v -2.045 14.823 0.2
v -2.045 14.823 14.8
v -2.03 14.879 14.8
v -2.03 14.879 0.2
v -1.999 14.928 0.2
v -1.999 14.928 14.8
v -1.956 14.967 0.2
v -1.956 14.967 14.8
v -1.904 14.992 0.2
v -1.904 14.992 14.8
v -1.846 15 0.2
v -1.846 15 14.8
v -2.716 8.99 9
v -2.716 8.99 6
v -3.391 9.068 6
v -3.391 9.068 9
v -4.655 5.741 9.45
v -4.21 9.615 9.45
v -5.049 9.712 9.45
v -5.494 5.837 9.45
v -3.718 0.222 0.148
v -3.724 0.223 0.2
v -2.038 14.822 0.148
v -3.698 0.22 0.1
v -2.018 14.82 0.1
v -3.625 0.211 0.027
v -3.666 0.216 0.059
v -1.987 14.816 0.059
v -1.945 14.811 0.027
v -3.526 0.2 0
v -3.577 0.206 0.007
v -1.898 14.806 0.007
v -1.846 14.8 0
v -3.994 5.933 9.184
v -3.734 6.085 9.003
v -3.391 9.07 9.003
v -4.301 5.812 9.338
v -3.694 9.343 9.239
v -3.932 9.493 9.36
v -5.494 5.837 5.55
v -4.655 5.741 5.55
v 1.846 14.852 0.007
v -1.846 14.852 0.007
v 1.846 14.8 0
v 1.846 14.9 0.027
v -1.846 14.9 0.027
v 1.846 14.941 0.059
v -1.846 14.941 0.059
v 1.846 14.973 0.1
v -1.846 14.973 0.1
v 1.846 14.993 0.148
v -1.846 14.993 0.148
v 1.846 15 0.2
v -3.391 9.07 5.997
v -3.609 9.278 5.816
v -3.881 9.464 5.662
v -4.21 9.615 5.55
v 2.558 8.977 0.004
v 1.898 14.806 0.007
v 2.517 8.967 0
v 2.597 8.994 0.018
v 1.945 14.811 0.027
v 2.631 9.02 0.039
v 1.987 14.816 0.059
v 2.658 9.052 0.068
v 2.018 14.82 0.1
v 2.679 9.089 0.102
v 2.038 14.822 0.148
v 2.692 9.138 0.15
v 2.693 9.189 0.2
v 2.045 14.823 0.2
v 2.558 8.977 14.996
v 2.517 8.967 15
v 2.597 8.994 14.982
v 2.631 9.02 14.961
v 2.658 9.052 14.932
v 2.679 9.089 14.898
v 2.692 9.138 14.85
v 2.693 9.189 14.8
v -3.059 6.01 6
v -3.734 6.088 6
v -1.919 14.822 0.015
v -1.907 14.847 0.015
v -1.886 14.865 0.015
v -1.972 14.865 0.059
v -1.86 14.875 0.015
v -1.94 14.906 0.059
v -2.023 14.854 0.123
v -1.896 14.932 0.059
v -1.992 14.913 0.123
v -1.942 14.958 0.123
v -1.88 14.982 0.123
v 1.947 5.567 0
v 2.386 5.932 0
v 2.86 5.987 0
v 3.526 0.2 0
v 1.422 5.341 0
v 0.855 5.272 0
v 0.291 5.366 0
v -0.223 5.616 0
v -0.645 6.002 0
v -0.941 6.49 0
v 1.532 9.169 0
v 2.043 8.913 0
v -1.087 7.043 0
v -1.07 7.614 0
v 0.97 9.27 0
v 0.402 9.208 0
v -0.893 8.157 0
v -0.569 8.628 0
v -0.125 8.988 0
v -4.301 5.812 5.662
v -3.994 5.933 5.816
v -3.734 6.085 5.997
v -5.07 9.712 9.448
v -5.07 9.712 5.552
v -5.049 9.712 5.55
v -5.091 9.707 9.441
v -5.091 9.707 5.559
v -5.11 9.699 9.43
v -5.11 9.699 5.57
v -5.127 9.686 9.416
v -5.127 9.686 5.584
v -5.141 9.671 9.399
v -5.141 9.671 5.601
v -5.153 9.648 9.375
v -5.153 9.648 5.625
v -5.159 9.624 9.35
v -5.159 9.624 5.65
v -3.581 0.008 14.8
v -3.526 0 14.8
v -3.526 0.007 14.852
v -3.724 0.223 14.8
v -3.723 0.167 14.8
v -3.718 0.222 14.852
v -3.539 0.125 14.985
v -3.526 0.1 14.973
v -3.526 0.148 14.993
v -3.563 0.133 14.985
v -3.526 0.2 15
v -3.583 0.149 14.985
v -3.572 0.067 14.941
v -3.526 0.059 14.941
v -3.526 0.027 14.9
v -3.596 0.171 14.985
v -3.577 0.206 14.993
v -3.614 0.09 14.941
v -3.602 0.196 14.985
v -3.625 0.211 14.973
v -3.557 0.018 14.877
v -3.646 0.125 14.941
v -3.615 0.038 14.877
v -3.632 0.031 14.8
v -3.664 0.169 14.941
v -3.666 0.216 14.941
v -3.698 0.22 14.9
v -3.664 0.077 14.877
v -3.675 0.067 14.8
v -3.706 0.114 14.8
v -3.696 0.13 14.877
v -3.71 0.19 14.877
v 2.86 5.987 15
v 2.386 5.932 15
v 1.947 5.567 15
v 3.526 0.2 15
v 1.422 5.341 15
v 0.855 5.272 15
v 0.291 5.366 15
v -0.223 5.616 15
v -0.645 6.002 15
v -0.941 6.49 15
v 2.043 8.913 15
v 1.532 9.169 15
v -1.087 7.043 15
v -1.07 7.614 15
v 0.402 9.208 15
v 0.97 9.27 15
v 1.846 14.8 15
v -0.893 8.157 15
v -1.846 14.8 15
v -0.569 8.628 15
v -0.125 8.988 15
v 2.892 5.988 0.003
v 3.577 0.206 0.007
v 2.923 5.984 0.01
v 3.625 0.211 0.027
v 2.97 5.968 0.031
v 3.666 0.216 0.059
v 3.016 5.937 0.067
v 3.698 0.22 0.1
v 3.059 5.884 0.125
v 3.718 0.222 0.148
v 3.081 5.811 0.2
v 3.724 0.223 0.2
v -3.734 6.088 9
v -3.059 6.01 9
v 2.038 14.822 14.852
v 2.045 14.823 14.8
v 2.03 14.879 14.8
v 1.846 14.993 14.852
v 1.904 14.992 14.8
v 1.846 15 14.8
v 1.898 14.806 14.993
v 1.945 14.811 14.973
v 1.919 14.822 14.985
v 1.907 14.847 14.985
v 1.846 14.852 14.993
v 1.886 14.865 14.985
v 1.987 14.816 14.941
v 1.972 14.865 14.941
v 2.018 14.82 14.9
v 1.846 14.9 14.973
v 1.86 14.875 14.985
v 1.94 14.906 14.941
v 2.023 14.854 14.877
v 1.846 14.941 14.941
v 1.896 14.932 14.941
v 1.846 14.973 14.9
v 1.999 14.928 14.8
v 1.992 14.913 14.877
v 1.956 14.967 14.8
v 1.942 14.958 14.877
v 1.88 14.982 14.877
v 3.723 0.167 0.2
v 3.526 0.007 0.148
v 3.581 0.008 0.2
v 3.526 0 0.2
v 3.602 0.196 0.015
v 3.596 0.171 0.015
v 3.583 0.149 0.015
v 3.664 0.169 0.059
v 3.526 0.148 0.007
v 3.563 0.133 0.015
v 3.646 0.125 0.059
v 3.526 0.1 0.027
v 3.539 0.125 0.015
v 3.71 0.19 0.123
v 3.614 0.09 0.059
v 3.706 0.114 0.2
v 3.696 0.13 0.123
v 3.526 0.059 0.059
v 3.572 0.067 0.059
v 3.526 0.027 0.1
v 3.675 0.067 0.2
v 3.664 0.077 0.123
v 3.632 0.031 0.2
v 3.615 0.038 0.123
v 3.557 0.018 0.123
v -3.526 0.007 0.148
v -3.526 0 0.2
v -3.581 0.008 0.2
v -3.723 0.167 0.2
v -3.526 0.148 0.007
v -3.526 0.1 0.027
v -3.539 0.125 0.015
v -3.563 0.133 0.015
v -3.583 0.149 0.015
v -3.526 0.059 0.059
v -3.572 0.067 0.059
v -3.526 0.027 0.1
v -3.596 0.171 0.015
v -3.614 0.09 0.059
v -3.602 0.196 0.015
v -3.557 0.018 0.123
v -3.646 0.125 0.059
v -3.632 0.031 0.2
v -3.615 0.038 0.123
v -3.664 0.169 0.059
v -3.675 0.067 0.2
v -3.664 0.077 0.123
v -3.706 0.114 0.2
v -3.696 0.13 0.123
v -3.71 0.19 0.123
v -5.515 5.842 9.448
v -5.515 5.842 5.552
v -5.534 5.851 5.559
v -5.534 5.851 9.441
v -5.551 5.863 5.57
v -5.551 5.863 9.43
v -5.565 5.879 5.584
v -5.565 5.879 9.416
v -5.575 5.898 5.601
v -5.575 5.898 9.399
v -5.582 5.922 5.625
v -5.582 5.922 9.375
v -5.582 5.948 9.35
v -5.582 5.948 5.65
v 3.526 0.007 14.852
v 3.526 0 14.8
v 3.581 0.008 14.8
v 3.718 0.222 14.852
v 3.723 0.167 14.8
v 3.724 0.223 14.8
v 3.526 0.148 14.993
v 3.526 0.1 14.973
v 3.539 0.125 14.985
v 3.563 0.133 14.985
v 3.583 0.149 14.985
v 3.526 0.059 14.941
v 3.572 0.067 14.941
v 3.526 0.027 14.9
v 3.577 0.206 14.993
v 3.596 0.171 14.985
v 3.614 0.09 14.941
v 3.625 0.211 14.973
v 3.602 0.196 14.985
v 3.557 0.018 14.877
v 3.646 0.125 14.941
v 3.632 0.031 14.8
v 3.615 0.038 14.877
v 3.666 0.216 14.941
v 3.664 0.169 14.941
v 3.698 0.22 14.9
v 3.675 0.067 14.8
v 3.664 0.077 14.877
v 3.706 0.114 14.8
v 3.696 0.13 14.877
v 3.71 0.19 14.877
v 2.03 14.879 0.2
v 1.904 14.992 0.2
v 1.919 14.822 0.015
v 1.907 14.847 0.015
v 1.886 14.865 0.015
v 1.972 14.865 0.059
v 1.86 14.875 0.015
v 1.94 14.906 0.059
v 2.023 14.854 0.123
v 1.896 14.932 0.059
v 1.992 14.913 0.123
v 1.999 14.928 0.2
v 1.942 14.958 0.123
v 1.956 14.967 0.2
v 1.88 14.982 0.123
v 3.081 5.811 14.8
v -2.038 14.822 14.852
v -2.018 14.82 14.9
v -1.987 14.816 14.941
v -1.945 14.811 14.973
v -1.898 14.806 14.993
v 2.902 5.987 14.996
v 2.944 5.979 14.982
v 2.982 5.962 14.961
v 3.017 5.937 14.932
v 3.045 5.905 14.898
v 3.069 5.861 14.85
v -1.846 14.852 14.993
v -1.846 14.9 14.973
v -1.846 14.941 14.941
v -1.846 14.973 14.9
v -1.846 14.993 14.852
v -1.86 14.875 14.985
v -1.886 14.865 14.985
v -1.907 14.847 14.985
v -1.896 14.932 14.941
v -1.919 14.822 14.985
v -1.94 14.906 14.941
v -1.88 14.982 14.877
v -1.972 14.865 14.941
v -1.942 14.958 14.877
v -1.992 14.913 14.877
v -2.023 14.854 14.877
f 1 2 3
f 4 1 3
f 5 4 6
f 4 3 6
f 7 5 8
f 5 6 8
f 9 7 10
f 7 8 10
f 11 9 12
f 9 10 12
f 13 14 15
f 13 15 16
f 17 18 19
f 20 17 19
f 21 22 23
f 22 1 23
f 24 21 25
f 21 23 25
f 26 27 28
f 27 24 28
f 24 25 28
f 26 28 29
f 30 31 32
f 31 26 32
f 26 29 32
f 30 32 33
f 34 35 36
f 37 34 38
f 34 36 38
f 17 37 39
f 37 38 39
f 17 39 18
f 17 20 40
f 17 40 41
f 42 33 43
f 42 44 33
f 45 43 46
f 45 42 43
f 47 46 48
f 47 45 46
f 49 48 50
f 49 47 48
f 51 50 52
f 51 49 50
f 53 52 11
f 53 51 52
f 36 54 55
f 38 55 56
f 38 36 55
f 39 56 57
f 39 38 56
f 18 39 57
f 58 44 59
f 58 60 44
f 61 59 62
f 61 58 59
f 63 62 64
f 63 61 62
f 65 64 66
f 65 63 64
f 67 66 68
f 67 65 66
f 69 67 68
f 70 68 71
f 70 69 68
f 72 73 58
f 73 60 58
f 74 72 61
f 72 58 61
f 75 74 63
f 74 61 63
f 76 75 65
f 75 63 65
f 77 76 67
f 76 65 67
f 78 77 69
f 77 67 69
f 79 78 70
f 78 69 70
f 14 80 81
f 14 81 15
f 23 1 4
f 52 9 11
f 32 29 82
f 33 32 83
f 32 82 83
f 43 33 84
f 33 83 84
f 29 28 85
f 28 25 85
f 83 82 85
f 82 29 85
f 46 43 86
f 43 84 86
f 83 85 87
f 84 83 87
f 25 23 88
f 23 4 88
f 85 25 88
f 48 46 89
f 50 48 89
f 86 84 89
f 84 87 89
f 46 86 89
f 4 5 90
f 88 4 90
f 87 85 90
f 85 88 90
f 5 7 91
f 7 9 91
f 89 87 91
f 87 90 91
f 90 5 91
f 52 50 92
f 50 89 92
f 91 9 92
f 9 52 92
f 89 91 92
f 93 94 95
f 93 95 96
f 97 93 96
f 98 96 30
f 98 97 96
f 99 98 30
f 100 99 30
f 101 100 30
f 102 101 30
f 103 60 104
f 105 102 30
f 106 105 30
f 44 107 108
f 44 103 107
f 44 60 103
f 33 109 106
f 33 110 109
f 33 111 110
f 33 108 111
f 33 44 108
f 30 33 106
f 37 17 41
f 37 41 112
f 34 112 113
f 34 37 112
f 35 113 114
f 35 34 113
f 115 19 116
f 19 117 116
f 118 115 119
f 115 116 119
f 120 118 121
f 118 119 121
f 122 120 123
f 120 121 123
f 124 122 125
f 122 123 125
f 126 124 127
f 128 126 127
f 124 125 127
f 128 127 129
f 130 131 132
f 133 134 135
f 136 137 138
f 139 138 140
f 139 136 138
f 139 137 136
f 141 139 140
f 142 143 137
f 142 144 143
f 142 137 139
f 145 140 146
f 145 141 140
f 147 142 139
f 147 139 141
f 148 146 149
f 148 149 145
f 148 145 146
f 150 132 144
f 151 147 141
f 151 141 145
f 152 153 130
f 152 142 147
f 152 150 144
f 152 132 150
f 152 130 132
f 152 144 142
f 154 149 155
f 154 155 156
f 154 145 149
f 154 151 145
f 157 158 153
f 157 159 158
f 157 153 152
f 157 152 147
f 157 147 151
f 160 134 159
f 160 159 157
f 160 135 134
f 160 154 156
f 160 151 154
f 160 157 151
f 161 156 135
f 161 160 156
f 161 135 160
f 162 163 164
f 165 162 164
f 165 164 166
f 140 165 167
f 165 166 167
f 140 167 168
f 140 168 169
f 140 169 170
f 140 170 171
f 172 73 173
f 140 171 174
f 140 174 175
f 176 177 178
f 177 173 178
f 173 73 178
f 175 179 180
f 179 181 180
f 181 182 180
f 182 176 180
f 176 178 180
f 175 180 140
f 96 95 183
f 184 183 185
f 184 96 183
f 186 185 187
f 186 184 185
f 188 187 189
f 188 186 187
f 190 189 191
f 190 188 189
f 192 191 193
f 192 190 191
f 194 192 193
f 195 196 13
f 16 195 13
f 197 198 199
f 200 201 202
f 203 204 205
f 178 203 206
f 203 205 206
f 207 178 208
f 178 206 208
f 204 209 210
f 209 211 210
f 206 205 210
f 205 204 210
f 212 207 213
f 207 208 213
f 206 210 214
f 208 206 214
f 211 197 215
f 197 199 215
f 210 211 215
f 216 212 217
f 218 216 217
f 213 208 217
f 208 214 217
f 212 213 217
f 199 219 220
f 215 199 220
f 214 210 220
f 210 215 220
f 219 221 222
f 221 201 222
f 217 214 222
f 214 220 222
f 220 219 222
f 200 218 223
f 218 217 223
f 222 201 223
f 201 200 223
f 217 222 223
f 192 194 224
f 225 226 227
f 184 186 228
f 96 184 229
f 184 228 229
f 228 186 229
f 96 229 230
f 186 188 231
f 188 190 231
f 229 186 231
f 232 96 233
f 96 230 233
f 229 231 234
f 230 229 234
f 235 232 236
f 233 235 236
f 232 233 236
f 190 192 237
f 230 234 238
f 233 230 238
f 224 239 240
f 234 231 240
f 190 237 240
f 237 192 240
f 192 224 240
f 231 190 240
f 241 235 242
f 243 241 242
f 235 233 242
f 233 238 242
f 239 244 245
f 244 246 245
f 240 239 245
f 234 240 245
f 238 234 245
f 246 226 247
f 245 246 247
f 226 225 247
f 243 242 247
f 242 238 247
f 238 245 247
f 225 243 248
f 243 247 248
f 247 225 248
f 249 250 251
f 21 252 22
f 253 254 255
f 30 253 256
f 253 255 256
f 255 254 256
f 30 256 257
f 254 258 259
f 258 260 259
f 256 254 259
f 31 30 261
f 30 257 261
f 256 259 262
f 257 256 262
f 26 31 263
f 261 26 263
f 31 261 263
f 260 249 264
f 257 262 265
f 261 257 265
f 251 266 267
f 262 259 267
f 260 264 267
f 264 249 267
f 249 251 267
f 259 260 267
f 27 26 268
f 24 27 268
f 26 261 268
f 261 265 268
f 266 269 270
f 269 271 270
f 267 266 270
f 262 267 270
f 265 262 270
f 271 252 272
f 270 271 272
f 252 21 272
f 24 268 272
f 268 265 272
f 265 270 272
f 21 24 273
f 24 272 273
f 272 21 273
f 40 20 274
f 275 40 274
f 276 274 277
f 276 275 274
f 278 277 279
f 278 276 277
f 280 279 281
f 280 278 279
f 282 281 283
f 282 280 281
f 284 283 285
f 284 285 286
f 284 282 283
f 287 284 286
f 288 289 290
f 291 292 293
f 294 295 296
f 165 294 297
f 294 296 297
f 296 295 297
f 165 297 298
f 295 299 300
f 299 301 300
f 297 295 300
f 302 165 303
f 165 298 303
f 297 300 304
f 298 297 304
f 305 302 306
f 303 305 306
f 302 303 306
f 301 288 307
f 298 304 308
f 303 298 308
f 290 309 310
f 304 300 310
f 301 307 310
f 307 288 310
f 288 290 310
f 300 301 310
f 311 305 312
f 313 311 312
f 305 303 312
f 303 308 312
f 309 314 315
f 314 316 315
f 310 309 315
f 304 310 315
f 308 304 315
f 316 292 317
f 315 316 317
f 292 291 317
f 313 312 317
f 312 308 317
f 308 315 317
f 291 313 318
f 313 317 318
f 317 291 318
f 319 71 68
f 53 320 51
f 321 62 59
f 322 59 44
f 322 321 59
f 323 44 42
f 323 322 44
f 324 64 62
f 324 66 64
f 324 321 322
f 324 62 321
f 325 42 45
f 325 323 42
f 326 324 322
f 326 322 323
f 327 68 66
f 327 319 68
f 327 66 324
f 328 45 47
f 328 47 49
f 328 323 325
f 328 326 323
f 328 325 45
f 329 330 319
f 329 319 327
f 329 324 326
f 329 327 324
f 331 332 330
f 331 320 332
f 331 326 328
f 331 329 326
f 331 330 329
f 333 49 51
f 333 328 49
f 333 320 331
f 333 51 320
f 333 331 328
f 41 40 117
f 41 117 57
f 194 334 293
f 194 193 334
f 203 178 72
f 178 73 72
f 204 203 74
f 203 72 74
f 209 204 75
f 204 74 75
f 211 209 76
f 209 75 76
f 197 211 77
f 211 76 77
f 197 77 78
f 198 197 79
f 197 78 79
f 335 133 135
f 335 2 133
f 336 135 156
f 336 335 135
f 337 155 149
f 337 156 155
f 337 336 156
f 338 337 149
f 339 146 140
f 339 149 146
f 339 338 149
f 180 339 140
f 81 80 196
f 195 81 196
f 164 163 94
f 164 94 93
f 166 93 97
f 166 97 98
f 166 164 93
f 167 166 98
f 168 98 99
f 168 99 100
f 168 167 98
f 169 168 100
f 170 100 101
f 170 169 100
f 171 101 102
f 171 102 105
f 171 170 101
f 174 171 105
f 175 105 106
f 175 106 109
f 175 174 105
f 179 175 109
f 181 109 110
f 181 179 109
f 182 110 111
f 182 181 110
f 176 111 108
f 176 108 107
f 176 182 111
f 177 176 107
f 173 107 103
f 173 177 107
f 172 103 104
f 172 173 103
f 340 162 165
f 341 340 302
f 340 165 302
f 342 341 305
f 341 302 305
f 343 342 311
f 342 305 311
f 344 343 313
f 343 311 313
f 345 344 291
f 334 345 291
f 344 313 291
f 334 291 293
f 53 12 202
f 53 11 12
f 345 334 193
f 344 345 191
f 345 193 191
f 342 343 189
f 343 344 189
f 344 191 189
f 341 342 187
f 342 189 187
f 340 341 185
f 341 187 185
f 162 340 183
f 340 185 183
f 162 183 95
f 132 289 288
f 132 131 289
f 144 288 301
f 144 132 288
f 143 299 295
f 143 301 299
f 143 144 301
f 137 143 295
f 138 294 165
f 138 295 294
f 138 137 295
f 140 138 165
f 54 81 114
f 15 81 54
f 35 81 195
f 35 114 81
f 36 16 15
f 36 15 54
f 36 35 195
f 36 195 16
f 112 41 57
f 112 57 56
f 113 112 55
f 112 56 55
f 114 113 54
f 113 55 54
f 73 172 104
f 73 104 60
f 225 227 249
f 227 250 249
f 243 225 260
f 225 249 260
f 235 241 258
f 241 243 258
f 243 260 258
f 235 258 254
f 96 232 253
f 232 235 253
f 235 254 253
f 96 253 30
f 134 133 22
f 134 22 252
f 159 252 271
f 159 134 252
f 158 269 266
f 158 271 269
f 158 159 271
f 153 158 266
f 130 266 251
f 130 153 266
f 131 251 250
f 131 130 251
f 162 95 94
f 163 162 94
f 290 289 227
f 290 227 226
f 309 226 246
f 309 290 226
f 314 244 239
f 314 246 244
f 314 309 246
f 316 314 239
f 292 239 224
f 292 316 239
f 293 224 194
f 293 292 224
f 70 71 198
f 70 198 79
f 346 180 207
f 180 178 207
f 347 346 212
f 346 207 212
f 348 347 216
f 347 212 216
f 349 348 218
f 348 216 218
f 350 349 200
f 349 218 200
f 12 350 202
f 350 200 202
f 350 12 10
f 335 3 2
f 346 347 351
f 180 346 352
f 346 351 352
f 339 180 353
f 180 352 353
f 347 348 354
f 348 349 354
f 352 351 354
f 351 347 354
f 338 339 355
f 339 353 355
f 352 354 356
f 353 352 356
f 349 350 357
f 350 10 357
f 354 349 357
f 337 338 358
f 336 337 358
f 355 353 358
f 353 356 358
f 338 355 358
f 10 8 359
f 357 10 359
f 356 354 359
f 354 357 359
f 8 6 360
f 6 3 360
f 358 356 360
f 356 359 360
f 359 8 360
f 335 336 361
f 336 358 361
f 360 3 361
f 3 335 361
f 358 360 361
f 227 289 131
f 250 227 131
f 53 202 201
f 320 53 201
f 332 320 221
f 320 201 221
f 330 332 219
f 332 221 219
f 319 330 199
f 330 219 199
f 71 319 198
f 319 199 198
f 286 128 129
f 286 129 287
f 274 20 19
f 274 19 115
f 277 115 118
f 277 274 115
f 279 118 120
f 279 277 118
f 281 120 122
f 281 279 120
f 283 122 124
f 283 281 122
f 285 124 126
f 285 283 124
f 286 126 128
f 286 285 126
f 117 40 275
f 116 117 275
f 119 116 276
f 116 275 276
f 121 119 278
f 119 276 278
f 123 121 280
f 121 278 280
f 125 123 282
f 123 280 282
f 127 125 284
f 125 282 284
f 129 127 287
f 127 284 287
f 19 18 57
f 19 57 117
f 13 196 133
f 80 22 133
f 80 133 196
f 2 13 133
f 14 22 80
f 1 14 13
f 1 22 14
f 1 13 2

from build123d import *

# Parameters (mm, degrees)
EXTRUDE_1_DEPTH          = 15
CUT_EXTRUDE_1_DEPTH      = 15
SKETCH_3_W               = 3
SKETCH_3_H               = 3
EXTRUDE_2_DEPTH          = 0.68
EXTRUDE_3_DEPTH          = 1
EXTRUDE_3_DEPTH_BACK     = 4
CUT_EXTRUDE_2_DEPTH      = 3
CUT_EXTRUDE_2_DEPTH_BACK = 5
FILLET_3_R               = 0.2
FILLET_4_R               = 0.1


with BuildPart() as part:
    # 草图1 → 凸台-拉伸1 (new body)
    with BuildSketch(Plane.XY):
        Polygon((-3.75, 0), (-2.02443152, 15), (2.02443152, 15), (3.75, 0), align=None)
    extrude(amount=EXTRUDE_1_DEPTH)

    # 草图2 → 切除-拉伸1 (cut)
    with BuildSketch(Plane.XY.offset(15)):
        with BuildLine():
            Line((2.715789487, 8.990172149), (3.058642033, 6.009827851))
            Line((3.058642033, 6.009827851), (2.38595414, 5.93244325))
            ThreePointArc((2.38595414, 5.93244325), (-1.086576637, 7.042863273), (2.043101594, 8.912787547))
            Line((2.043101594, 8.912787547), (2.715789487, 8.990172149))
        make_face()
    extrude(amount=-CUT_EXTRUDE_1_DEPTH, mode=Mode.SUBTRACT)

    # 草图3 → 凸台-拉伸2 (add)
    with BuildSketch(Plane(origin=(-3.701021722, 0.425757762, 0), x_dir=(0, 0, 1), z_dir=(-0.9934480991964022, 0.11428418177094966, 0))):
        with Locations((7.5, 7.120897653)):
            Rectangle(SKETCH_3_W, SKETCH_3_H)
    extrude(amount=EXTRUDE_2_DEPTH)

    # 草图4 → 凸台-拉伸3 (add, two sides: drawn at the far end of the back side and taken through both)
    with BuildSketch(Plane(origin=(0, 0, 6), x_dir=(-1, 0, 0), z_dir=(0, 0, -1)).offset(-EXTRUDE_3_DEPTH_BACK)):
        with BuildLine():
            Line((5.593690162, 5.848486661), (4.65546812, 5.740555569))
            ThreePointArc((4.65546812, 5.740555569), (4.17347222, 5.855308115), (3.734476016, 6.085026481))
            Line((3.734476016, 6.085026481), (3.391044919, 9.070400006))
            ThreePointArc((3.391044919, 9.070400006), (3.76641144, 9.393800948), (4.209759811, 9.615003156))
            Line((4.209759811, 9.615003156), (5.147981853, 9.722934248))
            Line((5.147981853, 9.722934248), (5.593690162, 5.848486661))
        make_face()
    extrude(amount=EXTRUDE_3_DEPTH + EXTRUDE_3_DEPTH_BACK)

    # 草图5 → 切除-拉伸2 (cut, two sides: drawn at the far end of the back side and taken through both)
    with BuildSketch(Plane(origin=(0.642379689, 5.584070089, 0), x_dir=(0.9934480991964022, -0.11428418177094966, 0), z_dir=(-0.11428418177094966, -0.9934480991964022, 0)).offset(-CUT_EXTRUDE_2_DEPTH_BACK)):
        with BuildLine():
            Line((-6.225430372, 9.45), (-6.225430372, 10))
            Line((-6.225430372, 10), (-4.405430372, 10))
            Line((-4.405430372, 10), (-4.405430372, 9.002531198))
            ThreePointArc((-4.405430372, 9.002531198), (-4.815297141, 9.280914794), (-5.281020651, 9.45))
            Line((-5.281020651, 9.45), (-6.225430372, 9.45))
        make_face()
        with BuildLine():
            Line((-6.225430372, 5.55), (-5.281020651, 5.55))
            ThreePointArc((-5.281020651, 5.55), (-4.815297141, 5.719085206), (-4.405430372, 5.997468802))
            Line((-4.405430372, 5.997468802), (-4.405430372, 5))
            Line((-4.405430372, 5), (-6.225430372, 5))
            Line((-6.225430372, 5), (-6.225430372, 5.55))
        make_face()
    extrude(amount=CUT_EXTRUDE_2_DEPTH + CUT_EXTRUDE_2_DEPTH_BACK, mode=Mode.SUBTRACT)

    # 圆角3
    fillet_3_edges = [part.edges().sort_by_distance(p)[0] for p in [
        (0, 0, 15),
        (3.404321016, 3.004913926, 15),
        (2.370110504, 11.995086074, 0),
        (2.370110504, 11.995086074, 15),
        (3.058642033, 6.009827851, 7.5),
        (2.715789487, 8.990172149, 7.5),
        (0, 15, 15),
        (3.404321016, 3.004913926, 0),
        (0, 0, 0),
        (-2.88721576, 7.5, 0),
        (0, 15, 0),
        (-2.88721576, 7.5, 15),
        (2.02443152, 15, 7.5),
        (3.75, 0, 7.5),
        (-3.75, 0, 7.5),
        (-2.02443152, 15, 7.5),
    ]]
    fillet(fillet_3_edges, radius=FILLET_3_R)

    # 圆角4
    fillet_4_edges = [part.edges().sort_by_distance(p)[0] for p in [
        (-5.593690162, 5.848486661, 7.5),
        (-5.147981853, 9.722934248, 7.5),
        (-5.370836008, 7.785710454, 9.45),
        (-5.370836008, 7.785710454, 5.55),
    ]]
    fillet(fillet_4_edges, radius=FILLET_4_R)


solid = part.part
